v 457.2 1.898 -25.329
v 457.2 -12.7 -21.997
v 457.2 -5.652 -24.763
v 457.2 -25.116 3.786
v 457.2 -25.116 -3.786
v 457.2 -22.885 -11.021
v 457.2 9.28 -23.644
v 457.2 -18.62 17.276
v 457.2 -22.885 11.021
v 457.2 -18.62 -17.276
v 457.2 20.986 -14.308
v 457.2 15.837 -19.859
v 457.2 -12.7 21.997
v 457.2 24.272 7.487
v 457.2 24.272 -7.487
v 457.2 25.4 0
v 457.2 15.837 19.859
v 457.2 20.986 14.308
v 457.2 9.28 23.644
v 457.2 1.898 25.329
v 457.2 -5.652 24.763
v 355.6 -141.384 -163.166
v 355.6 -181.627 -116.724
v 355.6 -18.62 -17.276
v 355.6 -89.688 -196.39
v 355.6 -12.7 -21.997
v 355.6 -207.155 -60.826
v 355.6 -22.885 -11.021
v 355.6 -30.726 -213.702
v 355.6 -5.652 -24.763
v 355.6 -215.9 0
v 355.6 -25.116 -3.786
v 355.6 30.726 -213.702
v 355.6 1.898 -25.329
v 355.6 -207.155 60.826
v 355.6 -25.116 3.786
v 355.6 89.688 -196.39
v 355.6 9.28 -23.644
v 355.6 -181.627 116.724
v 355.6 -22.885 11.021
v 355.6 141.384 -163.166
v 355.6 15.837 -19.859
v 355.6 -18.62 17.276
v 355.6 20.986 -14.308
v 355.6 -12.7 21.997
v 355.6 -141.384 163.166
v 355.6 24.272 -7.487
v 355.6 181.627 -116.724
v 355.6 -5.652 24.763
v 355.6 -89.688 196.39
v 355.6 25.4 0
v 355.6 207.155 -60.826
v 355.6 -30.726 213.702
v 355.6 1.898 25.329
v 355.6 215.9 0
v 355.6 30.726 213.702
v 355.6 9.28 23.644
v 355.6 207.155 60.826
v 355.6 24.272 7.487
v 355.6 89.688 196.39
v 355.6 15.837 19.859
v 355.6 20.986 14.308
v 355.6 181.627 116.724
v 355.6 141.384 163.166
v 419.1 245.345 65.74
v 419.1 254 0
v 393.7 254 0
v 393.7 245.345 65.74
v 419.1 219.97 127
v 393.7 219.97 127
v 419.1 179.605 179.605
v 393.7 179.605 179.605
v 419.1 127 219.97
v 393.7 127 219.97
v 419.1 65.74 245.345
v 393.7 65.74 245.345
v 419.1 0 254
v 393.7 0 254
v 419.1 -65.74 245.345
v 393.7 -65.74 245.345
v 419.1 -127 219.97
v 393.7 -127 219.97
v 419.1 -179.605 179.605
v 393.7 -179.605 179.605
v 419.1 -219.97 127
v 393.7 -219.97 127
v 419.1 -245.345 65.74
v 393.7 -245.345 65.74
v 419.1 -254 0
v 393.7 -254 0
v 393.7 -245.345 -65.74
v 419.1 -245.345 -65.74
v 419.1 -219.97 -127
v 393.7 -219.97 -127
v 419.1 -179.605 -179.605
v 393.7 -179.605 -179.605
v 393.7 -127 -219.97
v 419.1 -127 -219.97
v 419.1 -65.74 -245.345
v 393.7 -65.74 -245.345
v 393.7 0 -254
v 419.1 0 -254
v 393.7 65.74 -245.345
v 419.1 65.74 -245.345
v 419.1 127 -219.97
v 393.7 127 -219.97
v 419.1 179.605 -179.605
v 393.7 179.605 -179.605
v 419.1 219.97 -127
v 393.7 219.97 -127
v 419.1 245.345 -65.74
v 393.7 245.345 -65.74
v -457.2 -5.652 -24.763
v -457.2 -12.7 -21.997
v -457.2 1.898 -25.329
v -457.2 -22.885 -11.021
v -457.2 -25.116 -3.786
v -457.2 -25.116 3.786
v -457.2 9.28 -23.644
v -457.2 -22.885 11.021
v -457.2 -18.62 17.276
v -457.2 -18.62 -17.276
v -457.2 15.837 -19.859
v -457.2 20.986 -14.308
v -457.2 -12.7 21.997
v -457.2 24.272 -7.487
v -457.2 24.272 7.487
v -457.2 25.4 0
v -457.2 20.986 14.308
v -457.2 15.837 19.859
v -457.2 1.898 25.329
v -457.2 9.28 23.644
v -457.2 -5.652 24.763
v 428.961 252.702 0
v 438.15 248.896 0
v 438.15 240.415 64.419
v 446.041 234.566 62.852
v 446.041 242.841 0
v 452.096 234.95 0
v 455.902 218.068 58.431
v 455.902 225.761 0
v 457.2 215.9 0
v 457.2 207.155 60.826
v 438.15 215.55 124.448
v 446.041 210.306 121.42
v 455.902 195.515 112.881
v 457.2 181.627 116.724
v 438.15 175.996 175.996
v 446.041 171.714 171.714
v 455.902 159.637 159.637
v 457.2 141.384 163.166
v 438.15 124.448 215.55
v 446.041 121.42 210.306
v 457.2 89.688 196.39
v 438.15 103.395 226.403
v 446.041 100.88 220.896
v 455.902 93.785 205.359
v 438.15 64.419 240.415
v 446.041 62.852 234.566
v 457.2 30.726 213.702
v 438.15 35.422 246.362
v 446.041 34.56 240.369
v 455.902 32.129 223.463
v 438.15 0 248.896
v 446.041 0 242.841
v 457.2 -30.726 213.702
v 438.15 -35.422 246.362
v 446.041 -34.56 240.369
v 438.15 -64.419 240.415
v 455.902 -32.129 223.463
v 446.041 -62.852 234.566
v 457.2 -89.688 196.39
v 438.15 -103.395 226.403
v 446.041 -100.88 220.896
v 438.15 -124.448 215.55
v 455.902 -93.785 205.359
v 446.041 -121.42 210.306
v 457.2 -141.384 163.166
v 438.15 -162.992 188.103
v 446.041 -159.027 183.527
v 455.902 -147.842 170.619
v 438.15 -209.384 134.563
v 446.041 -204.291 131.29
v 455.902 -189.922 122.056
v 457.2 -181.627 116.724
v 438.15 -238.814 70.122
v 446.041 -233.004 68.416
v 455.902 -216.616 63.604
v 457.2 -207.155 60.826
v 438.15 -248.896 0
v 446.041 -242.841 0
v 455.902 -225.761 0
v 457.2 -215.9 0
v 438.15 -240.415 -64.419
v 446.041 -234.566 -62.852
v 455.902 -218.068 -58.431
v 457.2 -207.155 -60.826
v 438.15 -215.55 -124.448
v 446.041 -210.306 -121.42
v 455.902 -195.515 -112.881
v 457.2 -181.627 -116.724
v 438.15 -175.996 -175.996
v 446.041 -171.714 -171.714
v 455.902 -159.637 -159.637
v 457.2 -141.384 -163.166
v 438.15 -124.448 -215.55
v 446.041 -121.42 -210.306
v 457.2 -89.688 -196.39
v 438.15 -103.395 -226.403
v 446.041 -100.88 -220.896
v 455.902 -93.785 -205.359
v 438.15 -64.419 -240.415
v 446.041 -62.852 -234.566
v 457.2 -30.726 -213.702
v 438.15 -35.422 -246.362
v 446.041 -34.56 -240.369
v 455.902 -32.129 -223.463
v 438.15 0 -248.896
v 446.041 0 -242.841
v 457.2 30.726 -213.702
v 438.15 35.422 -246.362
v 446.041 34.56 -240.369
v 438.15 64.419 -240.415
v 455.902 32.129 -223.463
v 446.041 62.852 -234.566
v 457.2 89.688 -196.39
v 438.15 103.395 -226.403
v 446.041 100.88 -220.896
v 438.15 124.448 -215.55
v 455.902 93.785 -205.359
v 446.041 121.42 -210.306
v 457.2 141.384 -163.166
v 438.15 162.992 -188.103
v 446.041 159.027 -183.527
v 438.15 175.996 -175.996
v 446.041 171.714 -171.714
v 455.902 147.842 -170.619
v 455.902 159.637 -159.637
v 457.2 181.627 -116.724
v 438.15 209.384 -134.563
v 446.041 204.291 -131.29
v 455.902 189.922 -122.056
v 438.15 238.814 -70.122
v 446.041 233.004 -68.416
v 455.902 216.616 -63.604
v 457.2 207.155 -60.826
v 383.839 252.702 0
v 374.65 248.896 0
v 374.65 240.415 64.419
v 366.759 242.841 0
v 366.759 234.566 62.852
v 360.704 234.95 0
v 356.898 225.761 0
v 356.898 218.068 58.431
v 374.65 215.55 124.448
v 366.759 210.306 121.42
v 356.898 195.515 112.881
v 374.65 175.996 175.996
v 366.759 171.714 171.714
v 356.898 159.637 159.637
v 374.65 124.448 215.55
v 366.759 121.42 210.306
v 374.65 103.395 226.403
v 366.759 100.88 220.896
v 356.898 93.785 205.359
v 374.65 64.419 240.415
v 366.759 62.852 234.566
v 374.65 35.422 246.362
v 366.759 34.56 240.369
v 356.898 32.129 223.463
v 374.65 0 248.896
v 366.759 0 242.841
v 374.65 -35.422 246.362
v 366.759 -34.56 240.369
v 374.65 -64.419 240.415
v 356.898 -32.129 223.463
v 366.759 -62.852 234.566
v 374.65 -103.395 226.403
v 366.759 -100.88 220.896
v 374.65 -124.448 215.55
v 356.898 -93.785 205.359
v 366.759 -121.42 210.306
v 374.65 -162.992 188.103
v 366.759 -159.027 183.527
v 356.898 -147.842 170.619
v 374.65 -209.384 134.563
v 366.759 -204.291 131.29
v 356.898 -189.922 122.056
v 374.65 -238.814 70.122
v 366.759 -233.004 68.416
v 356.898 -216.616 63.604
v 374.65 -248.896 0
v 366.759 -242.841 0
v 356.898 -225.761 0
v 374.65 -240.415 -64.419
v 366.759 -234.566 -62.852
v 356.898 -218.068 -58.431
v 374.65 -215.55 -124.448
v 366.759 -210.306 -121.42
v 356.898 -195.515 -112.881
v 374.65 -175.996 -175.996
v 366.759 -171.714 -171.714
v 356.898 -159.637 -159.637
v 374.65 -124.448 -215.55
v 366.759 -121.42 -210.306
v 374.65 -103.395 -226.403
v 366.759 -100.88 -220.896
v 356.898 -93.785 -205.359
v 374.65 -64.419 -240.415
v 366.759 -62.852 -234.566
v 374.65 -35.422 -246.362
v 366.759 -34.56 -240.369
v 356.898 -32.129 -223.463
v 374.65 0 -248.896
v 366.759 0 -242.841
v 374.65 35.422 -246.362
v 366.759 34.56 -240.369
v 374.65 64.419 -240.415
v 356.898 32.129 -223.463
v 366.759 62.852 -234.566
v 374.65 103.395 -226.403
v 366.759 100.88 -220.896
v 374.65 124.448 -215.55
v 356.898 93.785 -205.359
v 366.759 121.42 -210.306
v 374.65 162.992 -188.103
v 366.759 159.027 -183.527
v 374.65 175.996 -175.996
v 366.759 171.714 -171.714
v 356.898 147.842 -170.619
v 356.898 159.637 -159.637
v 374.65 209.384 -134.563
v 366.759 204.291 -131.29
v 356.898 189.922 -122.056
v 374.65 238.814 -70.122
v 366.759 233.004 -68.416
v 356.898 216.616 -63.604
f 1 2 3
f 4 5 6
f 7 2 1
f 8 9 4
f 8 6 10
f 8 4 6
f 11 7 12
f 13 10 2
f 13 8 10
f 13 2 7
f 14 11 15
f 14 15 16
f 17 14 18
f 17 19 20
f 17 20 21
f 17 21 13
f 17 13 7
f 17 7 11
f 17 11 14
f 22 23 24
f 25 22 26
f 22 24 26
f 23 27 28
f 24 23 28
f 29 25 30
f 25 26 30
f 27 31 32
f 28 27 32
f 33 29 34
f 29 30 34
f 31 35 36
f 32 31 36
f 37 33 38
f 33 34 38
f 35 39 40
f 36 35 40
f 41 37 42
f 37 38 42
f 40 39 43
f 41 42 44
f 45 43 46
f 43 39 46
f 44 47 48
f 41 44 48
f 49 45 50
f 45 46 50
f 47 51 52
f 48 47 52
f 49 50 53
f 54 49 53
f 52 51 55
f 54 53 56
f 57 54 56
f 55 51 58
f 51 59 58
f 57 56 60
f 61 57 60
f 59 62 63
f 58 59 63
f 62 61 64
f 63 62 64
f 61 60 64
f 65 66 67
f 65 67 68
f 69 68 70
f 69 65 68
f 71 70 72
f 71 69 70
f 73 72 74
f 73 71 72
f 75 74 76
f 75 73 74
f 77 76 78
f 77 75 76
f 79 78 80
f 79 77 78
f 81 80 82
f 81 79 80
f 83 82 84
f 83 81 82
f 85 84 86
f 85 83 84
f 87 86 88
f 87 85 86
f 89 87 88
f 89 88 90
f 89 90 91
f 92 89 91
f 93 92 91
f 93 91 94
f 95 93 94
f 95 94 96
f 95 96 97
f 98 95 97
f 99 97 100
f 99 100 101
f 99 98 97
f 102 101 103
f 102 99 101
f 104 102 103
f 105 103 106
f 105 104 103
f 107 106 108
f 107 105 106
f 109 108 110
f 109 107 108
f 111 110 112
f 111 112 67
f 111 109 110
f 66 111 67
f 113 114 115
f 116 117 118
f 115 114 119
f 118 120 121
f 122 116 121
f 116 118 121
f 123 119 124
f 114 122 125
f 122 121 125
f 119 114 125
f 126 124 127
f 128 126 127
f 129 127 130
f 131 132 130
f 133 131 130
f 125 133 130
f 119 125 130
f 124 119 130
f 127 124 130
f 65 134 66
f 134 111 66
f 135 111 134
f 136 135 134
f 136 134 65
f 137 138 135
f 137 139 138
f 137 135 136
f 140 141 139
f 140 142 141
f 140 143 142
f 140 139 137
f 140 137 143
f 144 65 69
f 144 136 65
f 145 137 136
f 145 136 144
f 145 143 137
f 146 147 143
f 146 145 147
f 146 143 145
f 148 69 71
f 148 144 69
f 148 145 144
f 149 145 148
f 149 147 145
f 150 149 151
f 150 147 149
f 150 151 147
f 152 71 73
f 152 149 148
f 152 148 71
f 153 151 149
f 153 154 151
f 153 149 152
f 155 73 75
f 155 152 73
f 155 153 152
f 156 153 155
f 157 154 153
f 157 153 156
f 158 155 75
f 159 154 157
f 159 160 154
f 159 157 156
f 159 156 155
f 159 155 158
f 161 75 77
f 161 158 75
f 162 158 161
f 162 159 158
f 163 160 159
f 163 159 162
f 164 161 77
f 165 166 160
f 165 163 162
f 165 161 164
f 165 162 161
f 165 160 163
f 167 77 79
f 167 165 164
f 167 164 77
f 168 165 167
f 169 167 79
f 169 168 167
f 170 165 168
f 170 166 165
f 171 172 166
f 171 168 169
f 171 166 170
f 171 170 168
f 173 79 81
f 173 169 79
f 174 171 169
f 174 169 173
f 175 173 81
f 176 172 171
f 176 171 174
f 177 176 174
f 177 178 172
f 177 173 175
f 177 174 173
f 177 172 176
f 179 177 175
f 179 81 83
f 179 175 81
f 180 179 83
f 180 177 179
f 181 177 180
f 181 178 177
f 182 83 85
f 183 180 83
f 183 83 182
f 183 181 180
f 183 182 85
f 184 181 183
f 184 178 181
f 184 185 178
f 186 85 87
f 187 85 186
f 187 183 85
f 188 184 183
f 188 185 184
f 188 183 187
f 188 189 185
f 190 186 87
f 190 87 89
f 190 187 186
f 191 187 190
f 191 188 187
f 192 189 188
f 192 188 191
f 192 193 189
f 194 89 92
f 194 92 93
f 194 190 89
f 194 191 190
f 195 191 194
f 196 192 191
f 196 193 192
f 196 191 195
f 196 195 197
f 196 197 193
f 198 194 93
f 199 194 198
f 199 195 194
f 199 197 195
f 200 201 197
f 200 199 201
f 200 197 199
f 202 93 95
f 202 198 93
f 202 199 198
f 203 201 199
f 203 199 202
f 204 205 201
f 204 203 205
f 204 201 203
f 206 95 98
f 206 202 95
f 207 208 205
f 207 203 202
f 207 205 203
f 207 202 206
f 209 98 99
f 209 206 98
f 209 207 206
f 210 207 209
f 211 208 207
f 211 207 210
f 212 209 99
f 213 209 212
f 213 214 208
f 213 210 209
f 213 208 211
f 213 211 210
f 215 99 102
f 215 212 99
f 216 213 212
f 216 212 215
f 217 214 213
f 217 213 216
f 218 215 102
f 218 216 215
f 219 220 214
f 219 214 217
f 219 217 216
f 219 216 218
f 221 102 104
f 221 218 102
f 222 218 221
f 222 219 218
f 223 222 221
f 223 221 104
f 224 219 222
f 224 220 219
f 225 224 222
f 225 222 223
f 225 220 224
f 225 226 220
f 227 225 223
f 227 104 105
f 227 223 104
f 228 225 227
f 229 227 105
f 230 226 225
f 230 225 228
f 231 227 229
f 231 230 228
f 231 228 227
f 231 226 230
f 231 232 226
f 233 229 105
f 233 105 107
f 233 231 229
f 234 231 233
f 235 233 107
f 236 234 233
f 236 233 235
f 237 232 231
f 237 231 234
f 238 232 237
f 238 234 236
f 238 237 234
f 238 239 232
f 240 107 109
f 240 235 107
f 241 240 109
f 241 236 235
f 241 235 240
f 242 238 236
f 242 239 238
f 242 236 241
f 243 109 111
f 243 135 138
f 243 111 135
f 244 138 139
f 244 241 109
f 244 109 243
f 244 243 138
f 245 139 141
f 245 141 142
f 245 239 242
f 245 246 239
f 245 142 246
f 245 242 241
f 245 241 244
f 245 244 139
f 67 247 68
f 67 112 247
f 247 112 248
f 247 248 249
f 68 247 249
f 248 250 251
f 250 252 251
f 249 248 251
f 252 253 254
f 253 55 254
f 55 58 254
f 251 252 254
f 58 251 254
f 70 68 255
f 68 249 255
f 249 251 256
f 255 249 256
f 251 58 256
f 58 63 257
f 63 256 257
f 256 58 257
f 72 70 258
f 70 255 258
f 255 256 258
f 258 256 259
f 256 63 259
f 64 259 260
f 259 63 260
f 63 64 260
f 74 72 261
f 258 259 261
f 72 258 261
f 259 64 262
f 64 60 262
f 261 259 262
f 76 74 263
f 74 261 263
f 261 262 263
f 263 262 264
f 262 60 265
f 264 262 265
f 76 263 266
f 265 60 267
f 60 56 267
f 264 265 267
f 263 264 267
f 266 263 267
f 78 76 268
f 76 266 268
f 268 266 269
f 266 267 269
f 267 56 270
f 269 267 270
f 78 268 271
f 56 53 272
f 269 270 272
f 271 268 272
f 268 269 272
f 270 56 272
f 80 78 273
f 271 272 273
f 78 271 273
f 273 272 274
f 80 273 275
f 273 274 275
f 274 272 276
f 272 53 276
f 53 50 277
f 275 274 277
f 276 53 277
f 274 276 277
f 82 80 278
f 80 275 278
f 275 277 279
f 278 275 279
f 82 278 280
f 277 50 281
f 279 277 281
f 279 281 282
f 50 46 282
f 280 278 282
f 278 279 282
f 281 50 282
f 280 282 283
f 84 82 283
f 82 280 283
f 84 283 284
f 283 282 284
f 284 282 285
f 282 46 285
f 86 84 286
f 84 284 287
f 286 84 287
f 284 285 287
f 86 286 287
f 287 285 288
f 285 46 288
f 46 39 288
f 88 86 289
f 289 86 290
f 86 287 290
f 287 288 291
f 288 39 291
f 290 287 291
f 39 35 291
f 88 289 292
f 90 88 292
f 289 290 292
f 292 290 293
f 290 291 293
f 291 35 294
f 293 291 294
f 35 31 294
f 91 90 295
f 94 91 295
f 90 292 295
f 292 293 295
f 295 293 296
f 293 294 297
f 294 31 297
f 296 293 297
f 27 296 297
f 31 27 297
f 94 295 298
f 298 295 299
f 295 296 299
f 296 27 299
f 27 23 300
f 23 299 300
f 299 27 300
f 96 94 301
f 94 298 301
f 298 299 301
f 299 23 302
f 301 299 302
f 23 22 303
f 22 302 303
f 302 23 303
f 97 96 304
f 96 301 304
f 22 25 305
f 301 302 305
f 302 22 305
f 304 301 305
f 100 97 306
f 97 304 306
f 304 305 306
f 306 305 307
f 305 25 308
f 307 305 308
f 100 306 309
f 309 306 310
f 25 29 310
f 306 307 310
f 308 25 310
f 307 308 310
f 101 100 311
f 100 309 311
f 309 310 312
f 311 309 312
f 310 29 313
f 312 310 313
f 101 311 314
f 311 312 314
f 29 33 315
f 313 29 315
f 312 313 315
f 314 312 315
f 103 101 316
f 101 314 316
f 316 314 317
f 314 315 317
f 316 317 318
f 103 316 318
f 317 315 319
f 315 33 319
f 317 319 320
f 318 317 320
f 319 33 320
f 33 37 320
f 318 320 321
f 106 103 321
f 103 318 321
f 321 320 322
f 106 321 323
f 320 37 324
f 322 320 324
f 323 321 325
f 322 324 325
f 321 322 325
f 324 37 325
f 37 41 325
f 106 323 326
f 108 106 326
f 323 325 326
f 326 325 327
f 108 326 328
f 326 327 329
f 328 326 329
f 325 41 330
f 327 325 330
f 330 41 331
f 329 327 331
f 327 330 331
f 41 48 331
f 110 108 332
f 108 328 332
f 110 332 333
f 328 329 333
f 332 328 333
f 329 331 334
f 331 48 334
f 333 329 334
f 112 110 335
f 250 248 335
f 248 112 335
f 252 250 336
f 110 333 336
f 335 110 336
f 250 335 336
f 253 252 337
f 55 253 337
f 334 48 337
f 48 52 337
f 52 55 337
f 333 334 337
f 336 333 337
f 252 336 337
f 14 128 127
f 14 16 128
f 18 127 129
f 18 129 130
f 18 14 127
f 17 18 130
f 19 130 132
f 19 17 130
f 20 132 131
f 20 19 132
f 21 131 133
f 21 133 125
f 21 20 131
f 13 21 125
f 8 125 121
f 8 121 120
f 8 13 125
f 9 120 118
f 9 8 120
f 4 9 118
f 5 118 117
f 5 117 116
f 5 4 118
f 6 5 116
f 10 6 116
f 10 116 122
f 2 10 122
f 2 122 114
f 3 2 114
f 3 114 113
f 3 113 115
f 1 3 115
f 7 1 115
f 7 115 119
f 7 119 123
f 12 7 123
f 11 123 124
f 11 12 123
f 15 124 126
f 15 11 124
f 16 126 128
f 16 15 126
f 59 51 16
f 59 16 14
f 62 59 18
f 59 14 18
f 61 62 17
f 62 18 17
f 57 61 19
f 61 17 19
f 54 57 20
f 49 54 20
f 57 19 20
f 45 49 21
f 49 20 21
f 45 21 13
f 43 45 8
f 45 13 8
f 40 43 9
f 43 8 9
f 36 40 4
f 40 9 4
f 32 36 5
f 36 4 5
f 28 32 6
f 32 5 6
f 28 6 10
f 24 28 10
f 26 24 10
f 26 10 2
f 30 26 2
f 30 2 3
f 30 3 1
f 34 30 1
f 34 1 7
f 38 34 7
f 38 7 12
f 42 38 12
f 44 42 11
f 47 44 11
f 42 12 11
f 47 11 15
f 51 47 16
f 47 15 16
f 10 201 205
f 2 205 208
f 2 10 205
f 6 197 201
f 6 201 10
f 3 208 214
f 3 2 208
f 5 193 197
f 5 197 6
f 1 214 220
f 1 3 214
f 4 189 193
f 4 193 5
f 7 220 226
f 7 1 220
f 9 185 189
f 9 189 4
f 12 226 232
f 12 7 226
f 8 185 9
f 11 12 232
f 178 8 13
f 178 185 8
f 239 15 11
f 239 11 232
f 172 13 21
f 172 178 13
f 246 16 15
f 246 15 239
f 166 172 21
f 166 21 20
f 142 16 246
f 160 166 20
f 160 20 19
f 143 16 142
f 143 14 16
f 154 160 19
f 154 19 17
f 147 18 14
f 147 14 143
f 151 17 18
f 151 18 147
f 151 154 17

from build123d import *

# Parameters (mm, degrees)
F0_R     = 25.4
F1_DEPTH = 457.2
F2_R     = 254
F2_R_2   = 25.4
F3_DEPTH = 101.6
F4_R     = 38.1


with BuildPart() as f1:
    # F0 (on Right) → F1 (new body, symmetric)
    with BuildSketch(Plane.YZ):
        Circle(F0_R)
    extrude(amount=F1_DEPTH, both=True)


with BuildPart() as f3:
    # F2 (on face) → F3 (new body)
    with BuildSketch(Plane.YZ.offset(457.2)):
        Circle(F2_R)
        Circle(F2_R_2, mode=Mode.SUBTRACT)
    extrude(amount=-F3_DEPTH)

    # F4
    f4_edges = [f3.edges().sort_by_distance(p)[0] for p in [
        (457.2, -254, 0),
        (355.6, -254, 0),
    ]]
    fillet(f4_edges, radius=F4_R)


solid = Compound([f1.part, f3.part])
